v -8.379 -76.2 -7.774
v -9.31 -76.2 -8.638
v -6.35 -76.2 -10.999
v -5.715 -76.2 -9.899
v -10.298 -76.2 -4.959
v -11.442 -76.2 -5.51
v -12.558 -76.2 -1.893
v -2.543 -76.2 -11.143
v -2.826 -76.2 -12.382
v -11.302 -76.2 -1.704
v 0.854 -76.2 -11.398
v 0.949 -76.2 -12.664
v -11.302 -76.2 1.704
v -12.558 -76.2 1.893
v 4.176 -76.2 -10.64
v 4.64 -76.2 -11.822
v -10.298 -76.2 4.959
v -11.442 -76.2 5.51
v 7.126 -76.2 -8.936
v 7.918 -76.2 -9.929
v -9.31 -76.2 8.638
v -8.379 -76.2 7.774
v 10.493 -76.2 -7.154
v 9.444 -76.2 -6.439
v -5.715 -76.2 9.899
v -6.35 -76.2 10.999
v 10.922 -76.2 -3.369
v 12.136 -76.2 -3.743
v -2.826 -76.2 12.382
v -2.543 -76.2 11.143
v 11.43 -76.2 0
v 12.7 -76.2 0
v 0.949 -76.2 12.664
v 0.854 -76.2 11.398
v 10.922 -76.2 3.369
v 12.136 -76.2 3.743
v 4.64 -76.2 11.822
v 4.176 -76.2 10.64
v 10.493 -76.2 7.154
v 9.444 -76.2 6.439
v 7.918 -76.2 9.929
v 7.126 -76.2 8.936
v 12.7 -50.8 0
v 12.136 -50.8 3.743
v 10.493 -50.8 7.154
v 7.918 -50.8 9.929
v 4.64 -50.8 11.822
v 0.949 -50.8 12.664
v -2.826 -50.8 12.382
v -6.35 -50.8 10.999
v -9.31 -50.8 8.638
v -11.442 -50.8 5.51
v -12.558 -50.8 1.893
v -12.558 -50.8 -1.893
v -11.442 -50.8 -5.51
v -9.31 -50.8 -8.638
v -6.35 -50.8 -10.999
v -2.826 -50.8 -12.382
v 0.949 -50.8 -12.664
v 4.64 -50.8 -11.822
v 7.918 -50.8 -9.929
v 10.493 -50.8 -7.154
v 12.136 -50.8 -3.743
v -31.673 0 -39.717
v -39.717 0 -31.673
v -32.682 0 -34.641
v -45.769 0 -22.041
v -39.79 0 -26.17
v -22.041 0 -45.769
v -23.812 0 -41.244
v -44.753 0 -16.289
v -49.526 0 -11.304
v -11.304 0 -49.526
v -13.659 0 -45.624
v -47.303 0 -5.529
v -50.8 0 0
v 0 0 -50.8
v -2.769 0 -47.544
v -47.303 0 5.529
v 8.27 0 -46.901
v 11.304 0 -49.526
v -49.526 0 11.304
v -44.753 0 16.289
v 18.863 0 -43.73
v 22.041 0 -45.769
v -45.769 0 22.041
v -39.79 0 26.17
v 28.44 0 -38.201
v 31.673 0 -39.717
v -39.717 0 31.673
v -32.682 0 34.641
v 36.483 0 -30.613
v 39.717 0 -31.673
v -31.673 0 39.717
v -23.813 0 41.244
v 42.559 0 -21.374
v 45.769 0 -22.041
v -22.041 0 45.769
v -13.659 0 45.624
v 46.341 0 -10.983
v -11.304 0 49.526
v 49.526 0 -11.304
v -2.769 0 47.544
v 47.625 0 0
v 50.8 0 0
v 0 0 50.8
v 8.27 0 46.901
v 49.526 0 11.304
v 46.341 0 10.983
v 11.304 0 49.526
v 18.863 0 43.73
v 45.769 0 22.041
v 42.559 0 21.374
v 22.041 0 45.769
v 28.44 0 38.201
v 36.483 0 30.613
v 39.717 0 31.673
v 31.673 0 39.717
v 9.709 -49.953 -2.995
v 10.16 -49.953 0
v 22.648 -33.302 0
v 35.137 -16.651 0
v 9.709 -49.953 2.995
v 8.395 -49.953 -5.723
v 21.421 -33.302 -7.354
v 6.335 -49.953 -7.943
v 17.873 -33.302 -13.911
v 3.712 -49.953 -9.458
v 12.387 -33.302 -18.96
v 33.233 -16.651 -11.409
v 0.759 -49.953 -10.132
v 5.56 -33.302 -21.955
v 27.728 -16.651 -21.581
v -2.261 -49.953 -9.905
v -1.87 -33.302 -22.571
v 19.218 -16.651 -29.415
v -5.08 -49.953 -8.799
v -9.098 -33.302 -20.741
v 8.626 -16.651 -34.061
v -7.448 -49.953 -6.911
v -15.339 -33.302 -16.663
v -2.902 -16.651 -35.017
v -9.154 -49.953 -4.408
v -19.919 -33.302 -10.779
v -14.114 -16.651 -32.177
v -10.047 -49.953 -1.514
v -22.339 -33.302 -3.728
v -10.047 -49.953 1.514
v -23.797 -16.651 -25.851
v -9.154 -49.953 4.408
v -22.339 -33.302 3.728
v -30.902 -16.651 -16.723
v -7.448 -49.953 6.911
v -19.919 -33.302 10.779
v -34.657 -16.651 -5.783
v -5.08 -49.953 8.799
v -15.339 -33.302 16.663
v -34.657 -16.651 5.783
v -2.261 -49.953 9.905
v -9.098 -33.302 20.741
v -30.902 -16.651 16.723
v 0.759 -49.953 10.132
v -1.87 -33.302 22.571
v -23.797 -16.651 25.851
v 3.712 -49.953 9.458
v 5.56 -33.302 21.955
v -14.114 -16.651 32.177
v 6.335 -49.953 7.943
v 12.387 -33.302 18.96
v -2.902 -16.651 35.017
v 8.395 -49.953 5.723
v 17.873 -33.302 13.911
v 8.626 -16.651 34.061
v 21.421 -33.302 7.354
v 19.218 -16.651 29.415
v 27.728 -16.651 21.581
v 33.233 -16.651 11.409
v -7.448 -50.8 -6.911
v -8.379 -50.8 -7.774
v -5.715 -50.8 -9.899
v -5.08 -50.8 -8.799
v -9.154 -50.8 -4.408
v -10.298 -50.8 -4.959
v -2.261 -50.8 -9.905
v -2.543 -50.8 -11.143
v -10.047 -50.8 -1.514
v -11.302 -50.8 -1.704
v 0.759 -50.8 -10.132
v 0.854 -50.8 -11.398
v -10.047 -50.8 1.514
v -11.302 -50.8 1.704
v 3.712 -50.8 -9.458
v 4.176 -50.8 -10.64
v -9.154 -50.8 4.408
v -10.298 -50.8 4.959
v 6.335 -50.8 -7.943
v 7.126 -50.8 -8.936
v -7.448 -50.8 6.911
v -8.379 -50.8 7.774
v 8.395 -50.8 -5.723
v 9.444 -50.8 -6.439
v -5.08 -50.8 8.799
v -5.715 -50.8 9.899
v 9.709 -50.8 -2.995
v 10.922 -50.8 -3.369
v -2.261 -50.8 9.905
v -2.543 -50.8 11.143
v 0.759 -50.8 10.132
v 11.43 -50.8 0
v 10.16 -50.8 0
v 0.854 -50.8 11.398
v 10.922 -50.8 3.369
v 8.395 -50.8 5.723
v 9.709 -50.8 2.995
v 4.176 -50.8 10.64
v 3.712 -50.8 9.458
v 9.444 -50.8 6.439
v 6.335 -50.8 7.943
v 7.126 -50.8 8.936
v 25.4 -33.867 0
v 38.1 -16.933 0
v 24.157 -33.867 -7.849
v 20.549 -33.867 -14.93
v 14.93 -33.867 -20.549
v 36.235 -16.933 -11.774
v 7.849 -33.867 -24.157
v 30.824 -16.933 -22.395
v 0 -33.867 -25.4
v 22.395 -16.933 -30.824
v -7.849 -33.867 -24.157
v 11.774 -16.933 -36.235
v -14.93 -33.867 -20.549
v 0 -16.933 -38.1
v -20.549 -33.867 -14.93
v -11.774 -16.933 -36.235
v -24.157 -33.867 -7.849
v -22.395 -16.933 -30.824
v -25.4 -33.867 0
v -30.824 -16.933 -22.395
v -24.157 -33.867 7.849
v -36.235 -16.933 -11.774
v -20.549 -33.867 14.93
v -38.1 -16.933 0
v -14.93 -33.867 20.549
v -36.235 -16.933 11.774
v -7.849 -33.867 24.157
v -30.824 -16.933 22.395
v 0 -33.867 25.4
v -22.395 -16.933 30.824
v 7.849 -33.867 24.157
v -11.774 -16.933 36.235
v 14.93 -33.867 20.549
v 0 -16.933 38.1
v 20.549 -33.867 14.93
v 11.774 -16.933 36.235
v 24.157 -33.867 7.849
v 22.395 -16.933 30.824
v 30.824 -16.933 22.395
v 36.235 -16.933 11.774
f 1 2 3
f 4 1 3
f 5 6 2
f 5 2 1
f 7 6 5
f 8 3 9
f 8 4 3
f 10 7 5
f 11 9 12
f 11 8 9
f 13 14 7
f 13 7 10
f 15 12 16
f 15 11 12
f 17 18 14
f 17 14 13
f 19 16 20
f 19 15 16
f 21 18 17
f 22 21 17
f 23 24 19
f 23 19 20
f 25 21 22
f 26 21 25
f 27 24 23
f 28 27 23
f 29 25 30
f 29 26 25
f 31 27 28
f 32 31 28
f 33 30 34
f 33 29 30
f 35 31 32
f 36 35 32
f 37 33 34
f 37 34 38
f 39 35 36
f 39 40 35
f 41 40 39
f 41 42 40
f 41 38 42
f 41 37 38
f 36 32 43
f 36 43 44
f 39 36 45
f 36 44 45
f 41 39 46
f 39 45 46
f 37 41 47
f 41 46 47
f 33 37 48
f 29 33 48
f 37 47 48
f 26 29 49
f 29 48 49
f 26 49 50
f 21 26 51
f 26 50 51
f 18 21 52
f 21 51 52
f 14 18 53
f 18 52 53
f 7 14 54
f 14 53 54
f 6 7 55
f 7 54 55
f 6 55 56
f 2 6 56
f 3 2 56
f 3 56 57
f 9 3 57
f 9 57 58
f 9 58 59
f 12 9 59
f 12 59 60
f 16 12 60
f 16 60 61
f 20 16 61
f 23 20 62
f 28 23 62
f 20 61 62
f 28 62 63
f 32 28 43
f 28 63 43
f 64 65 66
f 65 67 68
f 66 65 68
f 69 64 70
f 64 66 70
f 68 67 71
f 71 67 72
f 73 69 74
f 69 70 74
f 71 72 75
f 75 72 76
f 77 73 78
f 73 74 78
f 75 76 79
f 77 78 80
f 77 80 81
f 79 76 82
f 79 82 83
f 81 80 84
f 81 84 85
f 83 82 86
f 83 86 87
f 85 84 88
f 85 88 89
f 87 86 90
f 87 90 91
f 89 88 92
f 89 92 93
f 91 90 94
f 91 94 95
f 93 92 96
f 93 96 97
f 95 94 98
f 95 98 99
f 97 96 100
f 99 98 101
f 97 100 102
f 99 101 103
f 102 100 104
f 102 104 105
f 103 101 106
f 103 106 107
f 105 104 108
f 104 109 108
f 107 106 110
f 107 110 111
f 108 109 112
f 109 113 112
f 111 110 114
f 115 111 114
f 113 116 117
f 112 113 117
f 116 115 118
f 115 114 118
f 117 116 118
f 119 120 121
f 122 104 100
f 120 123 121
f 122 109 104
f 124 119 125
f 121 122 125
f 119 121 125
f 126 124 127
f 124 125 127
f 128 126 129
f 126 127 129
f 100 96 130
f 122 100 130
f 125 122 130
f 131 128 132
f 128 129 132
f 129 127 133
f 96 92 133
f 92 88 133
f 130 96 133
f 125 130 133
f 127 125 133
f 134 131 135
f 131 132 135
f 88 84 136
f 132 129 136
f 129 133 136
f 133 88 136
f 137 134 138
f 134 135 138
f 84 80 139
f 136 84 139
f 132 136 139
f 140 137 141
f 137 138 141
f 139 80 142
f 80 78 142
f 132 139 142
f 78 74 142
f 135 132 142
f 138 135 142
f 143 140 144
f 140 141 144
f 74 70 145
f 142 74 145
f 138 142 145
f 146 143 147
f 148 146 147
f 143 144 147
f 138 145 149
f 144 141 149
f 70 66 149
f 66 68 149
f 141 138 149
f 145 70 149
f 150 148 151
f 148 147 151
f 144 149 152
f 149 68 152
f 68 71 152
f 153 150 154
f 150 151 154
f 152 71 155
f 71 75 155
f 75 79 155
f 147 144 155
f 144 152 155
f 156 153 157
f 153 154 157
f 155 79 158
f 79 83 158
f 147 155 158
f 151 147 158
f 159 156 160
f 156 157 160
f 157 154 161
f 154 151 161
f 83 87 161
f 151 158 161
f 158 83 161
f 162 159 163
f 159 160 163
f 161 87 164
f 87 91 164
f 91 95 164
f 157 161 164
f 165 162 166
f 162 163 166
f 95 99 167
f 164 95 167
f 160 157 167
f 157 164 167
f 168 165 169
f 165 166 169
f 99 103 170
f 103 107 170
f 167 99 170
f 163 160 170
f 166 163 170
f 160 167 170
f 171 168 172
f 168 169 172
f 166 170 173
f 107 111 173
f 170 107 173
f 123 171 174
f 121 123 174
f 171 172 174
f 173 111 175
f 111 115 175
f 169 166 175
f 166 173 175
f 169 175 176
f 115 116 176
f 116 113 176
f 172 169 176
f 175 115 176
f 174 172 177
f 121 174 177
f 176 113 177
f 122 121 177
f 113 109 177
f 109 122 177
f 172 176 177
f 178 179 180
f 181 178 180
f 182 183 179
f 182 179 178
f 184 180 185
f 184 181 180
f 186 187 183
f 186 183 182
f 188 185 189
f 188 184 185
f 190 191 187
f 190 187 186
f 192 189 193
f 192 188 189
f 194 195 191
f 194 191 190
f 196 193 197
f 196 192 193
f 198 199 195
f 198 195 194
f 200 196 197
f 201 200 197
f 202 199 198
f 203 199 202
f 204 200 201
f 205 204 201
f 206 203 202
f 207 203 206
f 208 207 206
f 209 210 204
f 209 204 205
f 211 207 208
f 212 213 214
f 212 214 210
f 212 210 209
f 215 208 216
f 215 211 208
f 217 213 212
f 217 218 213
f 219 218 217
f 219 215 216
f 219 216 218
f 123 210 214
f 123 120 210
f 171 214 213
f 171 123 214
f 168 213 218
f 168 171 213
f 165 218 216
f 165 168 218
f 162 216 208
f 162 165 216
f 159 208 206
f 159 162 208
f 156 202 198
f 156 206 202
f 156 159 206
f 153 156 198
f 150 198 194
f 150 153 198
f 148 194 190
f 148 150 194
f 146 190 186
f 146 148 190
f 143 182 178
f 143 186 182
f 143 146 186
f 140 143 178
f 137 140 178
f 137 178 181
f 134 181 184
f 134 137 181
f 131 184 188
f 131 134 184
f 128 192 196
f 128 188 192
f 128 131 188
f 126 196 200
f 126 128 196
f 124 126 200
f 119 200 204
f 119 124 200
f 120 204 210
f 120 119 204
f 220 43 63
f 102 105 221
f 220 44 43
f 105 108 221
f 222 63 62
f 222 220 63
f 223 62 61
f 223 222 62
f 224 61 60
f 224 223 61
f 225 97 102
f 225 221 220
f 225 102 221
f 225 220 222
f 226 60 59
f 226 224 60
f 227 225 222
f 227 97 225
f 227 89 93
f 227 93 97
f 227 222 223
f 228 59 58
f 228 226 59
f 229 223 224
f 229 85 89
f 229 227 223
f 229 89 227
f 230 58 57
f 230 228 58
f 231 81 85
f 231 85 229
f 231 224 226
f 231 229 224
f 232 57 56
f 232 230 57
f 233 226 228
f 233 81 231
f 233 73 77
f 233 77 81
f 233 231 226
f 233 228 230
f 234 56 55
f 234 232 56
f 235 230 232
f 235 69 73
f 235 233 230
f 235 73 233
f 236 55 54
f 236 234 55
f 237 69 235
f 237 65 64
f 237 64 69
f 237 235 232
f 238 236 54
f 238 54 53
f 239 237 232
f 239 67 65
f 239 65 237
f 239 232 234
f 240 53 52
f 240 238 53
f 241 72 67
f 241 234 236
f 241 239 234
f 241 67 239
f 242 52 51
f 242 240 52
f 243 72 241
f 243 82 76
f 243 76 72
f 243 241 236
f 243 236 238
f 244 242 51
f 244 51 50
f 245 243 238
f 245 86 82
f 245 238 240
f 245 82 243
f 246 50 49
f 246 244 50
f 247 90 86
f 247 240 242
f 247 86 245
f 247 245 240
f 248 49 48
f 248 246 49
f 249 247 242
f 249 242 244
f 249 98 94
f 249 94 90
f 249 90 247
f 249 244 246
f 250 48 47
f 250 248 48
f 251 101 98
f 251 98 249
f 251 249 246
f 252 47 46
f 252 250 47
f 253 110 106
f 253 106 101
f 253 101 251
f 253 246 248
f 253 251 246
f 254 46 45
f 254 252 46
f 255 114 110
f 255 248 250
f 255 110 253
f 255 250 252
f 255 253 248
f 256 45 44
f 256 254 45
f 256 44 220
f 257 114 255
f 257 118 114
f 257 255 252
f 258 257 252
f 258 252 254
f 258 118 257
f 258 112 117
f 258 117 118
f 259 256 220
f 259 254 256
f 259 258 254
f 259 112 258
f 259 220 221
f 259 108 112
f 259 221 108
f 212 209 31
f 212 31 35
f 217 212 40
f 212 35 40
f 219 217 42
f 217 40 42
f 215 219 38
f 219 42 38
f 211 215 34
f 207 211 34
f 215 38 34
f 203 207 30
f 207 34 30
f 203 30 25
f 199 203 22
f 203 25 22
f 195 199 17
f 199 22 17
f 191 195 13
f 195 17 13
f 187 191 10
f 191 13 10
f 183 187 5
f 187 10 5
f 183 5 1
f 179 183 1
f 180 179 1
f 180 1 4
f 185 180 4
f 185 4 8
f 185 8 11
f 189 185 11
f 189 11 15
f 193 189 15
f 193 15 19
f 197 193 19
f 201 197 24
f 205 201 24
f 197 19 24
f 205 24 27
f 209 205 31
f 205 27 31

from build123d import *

# Parameters (mm, degrees)
F2_R      = 12.7
F3_DEPTH  = 25.4
F3_FACE_R = 12.7
F0_R      = 50.8
F5_T      = -2.54
F6_R      = 11.43
F7_DEPTH  = 25.4


with BuildPart() as f3:
    # F2 (on offset) → F3 (new body)
    with BuildSketch(Plane.XZ.offset(50.8)):
        Circle(F2_R)
    extrude(amount=F3_DEPTH)

    # F3_face (on face) → F4 section 0
    with BuildSketch(Plane(origin=(0, -50.8, 0), x_dir=(1, 0, 0), z_dir=(0, 1, 0))):
        Circle(F3_FACE_R)
    # F0 (on Front) → F4 section 1
    with BuildSketch(Plane.XZ):
        Circle(F0_R)
    loft()

    # F5
    f5_openings = [f3.faces().sort_by_distance(p)[0] for p in [
        (0, 0, 0),
    ]]
    offset(amount=F5_T, openings=f5_openings, kind=Kind.INTERSECTION)

    # F6 (on face) → F7 (cut)
    with BuildSketch(Plane.XZ.offset(76.2)):
        Circle(F6_R)
    extrude(amount=-F7_DEPTH, mode=Mode.SUBTRACT)


solid = f3.part
